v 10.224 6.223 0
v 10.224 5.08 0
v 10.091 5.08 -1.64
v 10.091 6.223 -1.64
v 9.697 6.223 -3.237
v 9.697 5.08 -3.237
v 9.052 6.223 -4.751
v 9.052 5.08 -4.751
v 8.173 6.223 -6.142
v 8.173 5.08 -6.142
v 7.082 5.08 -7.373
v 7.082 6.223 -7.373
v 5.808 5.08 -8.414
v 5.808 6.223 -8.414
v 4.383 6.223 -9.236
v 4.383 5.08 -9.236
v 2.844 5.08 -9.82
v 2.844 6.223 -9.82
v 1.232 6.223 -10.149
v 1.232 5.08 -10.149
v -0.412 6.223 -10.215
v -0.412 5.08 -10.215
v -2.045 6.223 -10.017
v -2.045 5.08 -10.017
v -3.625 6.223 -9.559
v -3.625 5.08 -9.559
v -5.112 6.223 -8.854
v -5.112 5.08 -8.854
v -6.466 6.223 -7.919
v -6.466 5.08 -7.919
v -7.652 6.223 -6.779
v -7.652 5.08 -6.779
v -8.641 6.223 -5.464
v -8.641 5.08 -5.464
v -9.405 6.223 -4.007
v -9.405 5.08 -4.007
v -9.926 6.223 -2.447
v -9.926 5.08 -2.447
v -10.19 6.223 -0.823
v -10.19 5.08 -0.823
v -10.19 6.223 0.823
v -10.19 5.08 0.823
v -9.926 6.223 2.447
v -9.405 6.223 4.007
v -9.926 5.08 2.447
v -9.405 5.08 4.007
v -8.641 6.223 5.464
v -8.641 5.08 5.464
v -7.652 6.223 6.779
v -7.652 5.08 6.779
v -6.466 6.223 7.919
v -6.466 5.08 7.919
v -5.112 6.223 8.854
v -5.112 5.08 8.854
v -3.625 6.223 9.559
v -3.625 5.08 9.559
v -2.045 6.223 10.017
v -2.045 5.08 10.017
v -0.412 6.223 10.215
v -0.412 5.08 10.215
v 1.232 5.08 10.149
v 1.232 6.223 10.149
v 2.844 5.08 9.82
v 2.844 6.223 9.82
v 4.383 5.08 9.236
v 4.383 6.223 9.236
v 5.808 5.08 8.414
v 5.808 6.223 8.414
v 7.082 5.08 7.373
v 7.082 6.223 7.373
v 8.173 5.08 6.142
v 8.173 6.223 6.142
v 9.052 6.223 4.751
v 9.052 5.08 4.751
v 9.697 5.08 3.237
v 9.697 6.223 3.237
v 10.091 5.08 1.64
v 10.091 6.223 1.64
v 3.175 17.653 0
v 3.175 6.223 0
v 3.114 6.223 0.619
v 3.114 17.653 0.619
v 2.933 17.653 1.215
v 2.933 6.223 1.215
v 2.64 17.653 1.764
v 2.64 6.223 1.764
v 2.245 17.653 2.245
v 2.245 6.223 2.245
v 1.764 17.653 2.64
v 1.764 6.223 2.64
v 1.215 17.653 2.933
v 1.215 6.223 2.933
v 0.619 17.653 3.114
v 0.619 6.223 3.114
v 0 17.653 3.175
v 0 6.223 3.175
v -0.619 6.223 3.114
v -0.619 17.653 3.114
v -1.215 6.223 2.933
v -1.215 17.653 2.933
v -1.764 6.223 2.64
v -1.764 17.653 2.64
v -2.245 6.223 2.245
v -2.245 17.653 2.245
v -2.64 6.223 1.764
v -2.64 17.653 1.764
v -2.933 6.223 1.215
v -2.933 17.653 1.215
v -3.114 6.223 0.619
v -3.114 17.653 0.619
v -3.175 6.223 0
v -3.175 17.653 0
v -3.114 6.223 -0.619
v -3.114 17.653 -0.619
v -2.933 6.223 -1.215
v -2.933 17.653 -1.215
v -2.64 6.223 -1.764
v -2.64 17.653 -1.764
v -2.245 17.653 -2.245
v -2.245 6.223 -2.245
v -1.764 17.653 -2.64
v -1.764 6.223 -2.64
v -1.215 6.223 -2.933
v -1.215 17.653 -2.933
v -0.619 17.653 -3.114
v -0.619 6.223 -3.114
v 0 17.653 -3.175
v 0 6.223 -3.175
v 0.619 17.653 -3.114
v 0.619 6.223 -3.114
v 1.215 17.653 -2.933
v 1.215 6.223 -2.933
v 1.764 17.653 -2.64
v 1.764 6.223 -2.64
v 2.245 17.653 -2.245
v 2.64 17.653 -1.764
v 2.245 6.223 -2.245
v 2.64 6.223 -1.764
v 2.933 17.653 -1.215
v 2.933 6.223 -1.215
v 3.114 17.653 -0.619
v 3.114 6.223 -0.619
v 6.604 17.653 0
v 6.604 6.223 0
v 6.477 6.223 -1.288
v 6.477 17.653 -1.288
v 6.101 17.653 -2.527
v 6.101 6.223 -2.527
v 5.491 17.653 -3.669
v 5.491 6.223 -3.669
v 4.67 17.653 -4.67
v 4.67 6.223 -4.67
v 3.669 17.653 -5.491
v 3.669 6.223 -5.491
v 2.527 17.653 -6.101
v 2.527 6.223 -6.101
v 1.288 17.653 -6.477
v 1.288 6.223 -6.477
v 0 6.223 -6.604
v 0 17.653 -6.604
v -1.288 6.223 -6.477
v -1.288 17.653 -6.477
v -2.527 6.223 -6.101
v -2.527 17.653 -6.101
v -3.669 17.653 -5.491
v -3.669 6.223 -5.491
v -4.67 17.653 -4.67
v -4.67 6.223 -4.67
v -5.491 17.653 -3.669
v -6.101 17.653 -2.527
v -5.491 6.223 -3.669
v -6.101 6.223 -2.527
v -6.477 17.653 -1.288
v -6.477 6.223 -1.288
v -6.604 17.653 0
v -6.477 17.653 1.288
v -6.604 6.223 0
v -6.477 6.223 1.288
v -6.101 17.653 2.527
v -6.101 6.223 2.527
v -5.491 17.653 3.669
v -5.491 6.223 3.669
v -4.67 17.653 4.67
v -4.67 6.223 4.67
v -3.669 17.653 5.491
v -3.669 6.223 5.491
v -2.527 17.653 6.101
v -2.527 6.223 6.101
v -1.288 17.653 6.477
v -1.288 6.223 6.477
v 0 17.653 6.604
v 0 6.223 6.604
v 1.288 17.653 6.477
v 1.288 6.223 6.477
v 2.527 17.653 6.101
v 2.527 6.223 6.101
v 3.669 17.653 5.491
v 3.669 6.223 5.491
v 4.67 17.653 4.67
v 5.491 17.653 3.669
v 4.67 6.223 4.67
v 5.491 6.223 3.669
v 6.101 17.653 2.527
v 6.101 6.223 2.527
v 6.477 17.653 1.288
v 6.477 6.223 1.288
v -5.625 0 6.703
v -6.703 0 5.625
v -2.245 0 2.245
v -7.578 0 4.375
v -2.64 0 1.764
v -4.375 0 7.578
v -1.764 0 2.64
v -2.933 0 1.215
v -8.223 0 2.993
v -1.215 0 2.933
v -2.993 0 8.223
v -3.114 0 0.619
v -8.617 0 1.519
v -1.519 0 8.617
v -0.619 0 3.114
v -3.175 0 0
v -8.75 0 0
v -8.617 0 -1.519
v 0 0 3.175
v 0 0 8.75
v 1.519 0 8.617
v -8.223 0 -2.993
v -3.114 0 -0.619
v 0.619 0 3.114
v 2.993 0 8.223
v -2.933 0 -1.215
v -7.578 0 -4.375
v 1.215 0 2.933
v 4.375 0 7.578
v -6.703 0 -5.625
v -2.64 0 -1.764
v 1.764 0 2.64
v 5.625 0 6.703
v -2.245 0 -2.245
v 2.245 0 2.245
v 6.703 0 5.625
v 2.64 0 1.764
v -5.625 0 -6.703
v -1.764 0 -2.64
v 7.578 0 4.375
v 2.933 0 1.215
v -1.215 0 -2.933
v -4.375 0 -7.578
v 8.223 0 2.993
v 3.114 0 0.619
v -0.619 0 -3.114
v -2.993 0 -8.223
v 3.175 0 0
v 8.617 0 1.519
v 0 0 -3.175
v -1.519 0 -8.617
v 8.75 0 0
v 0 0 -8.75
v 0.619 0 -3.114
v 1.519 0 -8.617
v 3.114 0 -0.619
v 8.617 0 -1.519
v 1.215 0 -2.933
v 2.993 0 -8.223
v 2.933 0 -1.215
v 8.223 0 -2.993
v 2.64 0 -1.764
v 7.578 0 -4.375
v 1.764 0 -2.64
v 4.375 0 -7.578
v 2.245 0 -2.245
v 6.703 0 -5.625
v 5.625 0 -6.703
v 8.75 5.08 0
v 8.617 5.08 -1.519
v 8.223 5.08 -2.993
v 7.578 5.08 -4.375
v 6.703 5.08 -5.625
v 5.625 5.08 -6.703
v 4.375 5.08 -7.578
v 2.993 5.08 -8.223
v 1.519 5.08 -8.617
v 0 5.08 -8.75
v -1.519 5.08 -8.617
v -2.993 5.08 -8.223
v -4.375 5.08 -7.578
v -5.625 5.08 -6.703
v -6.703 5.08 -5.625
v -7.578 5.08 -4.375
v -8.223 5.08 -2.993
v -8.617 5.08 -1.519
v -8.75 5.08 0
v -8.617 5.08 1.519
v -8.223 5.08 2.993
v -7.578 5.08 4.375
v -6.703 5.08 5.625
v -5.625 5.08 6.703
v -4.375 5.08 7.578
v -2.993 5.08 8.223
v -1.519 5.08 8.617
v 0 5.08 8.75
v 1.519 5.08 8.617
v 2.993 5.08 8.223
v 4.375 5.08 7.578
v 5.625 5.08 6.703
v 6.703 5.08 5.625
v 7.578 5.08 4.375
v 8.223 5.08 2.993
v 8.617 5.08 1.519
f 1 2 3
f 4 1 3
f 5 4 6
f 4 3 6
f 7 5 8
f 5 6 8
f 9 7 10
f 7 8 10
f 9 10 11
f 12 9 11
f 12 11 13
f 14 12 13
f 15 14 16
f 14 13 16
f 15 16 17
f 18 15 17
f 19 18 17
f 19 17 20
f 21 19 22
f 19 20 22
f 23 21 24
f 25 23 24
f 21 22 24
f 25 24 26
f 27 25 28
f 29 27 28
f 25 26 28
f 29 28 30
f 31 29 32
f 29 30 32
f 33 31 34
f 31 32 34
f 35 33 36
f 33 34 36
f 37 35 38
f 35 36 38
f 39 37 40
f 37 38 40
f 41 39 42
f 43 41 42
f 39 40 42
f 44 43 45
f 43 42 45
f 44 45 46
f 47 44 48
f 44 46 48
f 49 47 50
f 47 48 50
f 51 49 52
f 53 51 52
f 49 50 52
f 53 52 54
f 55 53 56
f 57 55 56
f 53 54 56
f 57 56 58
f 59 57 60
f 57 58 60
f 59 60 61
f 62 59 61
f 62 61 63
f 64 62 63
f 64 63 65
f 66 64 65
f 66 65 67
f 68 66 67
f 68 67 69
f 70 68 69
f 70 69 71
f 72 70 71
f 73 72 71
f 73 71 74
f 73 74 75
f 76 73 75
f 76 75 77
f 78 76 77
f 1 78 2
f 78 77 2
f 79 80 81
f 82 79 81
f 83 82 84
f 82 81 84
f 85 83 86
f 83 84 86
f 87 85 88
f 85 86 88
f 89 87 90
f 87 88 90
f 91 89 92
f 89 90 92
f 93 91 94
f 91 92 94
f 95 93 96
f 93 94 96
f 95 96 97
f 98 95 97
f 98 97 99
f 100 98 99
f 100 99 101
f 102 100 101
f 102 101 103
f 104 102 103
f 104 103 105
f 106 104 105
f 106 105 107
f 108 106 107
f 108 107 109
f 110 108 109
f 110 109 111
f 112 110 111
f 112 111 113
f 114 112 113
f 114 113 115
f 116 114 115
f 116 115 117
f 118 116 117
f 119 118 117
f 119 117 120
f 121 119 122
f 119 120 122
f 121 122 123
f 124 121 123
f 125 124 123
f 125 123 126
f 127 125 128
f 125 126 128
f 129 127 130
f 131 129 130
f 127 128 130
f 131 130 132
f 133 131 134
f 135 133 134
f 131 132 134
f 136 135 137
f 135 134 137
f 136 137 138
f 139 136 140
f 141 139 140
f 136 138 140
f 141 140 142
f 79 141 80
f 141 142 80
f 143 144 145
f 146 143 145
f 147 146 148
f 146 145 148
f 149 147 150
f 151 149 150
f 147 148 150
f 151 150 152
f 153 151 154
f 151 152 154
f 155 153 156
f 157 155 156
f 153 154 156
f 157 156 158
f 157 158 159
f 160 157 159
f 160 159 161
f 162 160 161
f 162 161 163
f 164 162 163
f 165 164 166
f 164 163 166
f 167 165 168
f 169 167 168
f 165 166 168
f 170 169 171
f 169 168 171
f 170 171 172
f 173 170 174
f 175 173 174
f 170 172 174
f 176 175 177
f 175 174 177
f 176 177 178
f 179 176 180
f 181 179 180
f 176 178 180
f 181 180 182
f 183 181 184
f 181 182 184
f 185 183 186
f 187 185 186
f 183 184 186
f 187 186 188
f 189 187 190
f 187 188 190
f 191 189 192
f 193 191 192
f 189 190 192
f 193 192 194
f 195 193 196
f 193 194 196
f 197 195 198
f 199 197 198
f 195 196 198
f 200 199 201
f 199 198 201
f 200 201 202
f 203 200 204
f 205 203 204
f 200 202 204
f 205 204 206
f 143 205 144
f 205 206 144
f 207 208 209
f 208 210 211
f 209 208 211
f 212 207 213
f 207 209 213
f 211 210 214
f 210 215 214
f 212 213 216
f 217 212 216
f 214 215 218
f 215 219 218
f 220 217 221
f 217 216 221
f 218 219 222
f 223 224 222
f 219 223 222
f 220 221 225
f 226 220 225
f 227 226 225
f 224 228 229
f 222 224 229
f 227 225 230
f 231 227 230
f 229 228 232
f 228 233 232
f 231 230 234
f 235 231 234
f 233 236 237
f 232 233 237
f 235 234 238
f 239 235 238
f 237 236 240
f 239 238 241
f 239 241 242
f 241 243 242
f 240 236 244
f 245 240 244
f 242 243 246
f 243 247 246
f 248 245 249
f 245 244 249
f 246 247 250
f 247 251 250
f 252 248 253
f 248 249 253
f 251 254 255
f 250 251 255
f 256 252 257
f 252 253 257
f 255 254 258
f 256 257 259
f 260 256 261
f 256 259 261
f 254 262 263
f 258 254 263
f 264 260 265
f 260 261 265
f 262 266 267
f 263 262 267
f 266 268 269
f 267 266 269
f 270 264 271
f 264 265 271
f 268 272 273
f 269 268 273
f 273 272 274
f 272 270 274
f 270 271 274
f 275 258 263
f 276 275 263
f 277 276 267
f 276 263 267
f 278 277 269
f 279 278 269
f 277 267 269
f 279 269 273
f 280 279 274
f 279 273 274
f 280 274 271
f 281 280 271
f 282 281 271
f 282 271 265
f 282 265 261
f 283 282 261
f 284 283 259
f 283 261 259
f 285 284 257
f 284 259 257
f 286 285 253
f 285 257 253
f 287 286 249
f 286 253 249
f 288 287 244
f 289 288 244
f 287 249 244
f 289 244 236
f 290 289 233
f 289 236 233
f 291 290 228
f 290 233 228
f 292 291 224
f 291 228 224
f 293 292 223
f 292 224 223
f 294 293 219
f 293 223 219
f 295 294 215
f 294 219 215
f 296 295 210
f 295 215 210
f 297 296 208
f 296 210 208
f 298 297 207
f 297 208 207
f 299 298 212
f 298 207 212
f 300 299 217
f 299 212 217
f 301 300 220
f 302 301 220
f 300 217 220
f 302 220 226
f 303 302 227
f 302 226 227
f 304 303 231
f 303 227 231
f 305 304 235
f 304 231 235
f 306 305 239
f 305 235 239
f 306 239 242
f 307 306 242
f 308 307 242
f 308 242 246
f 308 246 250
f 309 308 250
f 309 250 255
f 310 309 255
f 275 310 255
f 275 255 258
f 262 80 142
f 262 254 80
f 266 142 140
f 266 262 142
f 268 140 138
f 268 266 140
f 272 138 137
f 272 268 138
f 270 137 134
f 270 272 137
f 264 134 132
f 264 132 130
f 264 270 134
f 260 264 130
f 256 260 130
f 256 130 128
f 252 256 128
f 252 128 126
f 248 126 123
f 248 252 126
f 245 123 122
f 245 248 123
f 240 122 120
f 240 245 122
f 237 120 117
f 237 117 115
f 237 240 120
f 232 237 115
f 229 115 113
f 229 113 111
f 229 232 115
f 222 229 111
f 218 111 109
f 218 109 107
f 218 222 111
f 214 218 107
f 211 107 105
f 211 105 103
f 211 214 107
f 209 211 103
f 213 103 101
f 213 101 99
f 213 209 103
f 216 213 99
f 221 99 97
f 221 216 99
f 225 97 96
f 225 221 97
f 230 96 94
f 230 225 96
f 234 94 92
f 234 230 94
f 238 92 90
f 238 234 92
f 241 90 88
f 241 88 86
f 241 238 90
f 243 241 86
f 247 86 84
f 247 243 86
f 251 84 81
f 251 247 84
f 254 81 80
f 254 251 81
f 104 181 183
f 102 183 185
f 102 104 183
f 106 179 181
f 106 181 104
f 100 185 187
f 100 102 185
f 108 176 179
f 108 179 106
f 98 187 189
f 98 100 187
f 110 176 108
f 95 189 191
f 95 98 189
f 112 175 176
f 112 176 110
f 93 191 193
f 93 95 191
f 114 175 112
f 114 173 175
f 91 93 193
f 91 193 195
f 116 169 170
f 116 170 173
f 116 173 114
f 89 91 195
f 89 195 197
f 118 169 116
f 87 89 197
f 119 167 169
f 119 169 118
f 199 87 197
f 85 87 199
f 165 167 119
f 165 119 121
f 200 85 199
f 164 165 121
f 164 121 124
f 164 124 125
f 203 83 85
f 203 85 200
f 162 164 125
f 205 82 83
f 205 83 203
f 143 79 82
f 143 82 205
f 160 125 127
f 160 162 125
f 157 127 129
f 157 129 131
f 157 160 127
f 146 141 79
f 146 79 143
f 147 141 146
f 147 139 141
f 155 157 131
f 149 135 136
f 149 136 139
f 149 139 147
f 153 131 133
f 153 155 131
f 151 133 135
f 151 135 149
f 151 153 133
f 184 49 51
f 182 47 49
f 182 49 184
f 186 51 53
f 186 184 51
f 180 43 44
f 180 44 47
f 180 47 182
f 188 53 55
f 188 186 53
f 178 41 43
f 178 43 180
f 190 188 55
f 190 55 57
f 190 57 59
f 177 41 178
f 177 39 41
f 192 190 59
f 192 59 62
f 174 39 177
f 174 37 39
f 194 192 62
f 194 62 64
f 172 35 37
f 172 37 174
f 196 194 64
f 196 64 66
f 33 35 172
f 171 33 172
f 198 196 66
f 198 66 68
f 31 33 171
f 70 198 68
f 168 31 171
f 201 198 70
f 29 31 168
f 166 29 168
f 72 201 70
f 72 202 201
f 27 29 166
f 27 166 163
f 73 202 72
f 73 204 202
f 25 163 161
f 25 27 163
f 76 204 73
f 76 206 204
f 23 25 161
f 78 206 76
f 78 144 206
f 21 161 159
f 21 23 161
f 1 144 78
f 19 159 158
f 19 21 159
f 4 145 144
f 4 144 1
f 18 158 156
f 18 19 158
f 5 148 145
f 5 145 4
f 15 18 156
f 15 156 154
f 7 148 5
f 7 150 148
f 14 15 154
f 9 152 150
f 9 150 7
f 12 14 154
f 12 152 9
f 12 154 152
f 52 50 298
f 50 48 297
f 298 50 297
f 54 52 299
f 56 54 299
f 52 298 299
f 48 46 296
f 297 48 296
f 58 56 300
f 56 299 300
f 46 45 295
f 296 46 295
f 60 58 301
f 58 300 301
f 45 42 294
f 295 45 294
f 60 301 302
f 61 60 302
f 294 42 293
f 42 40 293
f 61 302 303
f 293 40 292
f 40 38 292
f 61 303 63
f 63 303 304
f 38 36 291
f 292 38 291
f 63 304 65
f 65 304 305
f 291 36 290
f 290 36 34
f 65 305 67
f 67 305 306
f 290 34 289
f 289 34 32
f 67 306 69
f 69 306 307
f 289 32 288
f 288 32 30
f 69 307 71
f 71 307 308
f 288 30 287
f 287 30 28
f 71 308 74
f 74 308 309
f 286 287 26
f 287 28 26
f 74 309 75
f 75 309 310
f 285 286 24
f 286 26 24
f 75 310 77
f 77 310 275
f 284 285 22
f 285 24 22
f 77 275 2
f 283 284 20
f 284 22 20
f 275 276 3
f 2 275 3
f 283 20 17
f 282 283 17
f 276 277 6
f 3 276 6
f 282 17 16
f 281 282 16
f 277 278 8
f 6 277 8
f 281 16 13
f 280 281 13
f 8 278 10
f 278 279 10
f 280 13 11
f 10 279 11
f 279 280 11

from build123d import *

# Parameters (mm, degrees)
SKETCH1_R           = 8.7503
SKETCH1_R_2         = 3.175
BOSS_EXTRUDE1_DEPTH = 5.08
SKETCH2_R           = 10.2235
SKETCH2_R_2         = 3.175
BOSS_EXTRUDE2_DEPTH = 1.143
SKETCH3_R           = 6.604
BOSS_EXTRUDE3_DEPTH = 11.43
SKETCH4_R           = 3.175
CUT_EXTRUDE1_DEPTH  = 12.43


with BuildPart() as part:
    # Sketch1 → Boss-Extrude1 (new body)
    with BuildSketch(Plane(origin=(0, 0, 0), x_dir=(1, 0, 0), z_dir=(0, 1, 0))):
        Circle(SKETCH1_R)
        Circle(SKETCH1_R_2, mode=Mode.SUBTRACT)
    extrude(amount=BOSS_EXTRUDE1_DEPTH)

    # Sketch2 → Boss-Extrude2 (add)
    with BuildSketch(Plane(origin=(0, 5.08, 0), x_dir=(1, 0, 0), z_dir=(0, 1, 0))):
        Circle(SKETCH2_R)
        Circle(SKETCH2_R_2, mode=Mode.SUBTRACT)
    extrude(amount=BOSS_EXTRUDE2_DEPTH)

    # Sketch3 → Boss-Extrude3 (add)
    with BuildSketch(Plane(origin=(0, 6.223, 0), x_dir=(1, 0, 0), z_dir=(0, 1, 0))):
        Circle(SKETCH3_R)
    extrude(amount=BOSS_EXTRUDE3_DEPTH)

    # Sketch4 → Cut-Extrude1 (cut, through all)
    with BuildSketch(Plane.XZ.offset(-6.223)):
        Circle(SKETCH4_R)
    extrude(amount=-CUT_EXTRUDE1_DEPTH, mode=Mode.SUBTRACT)


solid = part.part
